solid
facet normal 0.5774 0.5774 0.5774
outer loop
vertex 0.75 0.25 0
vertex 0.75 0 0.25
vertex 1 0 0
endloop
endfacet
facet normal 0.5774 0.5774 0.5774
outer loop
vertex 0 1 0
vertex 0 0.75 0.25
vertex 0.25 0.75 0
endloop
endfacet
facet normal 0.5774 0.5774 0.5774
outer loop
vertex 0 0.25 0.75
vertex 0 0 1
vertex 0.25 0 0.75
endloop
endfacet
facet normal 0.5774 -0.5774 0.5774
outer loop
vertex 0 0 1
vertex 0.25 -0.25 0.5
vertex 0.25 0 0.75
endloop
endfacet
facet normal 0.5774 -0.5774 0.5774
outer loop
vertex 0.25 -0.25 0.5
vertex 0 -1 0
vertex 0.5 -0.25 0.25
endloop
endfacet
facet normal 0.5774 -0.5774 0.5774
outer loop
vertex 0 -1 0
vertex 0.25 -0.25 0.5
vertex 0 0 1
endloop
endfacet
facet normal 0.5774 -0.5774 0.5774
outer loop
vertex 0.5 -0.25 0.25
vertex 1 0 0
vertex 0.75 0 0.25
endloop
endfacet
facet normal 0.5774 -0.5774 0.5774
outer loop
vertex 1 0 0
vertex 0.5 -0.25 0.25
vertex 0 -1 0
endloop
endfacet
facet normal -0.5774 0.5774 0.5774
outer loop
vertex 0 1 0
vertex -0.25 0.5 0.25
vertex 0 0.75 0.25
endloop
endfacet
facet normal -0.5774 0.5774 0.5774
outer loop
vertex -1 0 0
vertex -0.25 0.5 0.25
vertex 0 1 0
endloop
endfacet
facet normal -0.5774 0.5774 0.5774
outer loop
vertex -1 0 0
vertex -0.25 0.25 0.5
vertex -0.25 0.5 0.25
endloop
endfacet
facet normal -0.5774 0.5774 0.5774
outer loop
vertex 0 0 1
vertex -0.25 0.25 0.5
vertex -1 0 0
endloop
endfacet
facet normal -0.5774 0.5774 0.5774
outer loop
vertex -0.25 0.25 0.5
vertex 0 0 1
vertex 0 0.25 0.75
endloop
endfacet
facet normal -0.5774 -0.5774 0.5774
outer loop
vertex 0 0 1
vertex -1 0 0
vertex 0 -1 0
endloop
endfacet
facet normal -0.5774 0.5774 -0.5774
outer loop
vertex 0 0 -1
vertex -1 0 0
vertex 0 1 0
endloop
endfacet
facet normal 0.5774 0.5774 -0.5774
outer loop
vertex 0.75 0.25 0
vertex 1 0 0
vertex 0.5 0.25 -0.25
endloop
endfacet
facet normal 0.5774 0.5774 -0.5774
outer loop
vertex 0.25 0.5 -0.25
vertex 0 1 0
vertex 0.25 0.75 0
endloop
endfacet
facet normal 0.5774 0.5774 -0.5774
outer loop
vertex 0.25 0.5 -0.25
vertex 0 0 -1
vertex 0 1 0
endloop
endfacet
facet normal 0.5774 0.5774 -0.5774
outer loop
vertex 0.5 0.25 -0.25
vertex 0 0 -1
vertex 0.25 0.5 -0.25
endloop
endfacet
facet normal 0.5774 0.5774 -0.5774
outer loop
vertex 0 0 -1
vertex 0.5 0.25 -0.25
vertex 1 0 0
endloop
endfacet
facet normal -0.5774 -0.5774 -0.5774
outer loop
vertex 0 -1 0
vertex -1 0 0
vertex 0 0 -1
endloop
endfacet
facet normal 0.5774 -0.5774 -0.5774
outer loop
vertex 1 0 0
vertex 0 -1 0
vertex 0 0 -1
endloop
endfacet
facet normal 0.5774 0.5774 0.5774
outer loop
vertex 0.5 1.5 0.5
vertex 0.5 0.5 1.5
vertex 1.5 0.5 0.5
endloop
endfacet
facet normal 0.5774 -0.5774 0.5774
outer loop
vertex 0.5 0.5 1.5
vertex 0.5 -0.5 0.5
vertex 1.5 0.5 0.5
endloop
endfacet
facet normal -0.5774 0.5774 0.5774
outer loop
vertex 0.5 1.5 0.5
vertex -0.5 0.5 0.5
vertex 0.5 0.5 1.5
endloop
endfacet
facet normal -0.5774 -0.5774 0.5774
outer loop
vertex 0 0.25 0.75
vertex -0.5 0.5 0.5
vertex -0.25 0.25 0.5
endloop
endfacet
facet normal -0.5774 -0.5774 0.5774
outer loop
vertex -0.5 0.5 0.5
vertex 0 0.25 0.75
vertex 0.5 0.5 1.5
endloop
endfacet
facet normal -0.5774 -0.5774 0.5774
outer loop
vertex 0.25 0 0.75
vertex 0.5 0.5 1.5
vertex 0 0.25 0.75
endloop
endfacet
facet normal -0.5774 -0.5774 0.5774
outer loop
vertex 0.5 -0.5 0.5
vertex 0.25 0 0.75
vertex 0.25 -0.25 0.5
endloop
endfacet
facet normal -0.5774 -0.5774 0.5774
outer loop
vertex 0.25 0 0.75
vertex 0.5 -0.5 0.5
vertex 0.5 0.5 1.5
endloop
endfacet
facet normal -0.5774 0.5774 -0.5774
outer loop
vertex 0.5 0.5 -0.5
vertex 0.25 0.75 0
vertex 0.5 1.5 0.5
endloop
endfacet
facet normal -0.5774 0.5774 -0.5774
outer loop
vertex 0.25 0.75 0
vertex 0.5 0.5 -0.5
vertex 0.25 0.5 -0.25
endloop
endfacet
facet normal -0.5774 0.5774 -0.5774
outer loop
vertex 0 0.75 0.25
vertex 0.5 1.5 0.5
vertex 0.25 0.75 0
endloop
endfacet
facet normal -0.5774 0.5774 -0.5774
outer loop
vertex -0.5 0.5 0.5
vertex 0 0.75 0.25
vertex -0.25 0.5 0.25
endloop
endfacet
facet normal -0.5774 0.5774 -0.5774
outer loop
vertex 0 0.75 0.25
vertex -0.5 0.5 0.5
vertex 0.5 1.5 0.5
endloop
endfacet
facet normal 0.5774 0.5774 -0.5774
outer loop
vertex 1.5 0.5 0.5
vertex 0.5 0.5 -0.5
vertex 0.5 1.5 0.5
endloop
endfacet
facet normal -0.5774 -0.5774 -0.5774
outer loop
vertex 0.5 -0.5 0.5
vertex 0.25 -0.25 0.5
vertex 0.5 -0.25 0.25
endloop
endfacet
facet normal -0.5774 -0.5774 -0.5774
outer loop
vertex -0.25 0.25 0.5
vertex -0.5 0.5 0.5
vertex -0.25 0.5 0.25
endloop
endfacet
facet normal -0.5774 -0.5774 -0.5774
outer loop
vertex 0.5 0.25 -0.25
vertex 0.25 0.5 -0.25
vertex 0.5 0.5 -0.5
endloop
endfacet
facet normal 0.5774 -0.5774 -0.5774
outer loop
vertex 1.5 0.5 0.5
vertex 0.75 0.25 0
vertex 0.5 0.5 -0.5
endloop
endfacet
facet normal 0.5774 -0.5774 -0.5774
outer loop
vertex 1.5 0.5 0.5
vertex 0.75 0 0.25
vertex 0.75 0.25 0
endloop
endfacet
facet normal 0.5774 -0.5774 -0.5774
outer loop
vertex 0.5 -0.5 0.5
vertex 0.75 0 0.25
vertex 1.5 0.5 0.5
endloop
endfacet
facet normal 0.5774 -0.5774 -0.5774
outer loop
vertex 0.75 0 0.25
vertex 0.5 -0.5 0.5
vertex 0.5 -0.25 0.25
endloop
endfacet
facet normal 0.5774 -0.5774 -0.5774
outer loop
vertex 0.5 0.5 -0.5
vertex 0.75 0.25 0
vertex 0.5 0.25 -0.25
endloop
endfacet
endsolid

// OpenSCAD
module octahedron(size = 1, center = false) {
	size = len(size) == 3 ? size : [size, size, size];
	move = center ? [0, 0, 0] : [
		size[0] / 2,
		size[1] / 2,
		size[2] / 2
	];
	translate(move)
		polyhedron(
			points = [
				[1, 0, 0],
				[0, 1, 0],
				[-1, 0, 0],
				[0, -1, 0],
				[0, 0, 1],
				[0, 0, -1]
			],
			triangles = [
				[4, 1, 0],
				[4, 2, 1],
				[4, 3, 2],
				[4, 0, 3],
				[5, 0, 1],
				[5, 1, 2],
				[5, 2, 3],
				[5, 3, 0]
			]
		);
}

color("red") octahedron([1, 1, 1], true); // Centered
color("green") octahedron(1, false); //
